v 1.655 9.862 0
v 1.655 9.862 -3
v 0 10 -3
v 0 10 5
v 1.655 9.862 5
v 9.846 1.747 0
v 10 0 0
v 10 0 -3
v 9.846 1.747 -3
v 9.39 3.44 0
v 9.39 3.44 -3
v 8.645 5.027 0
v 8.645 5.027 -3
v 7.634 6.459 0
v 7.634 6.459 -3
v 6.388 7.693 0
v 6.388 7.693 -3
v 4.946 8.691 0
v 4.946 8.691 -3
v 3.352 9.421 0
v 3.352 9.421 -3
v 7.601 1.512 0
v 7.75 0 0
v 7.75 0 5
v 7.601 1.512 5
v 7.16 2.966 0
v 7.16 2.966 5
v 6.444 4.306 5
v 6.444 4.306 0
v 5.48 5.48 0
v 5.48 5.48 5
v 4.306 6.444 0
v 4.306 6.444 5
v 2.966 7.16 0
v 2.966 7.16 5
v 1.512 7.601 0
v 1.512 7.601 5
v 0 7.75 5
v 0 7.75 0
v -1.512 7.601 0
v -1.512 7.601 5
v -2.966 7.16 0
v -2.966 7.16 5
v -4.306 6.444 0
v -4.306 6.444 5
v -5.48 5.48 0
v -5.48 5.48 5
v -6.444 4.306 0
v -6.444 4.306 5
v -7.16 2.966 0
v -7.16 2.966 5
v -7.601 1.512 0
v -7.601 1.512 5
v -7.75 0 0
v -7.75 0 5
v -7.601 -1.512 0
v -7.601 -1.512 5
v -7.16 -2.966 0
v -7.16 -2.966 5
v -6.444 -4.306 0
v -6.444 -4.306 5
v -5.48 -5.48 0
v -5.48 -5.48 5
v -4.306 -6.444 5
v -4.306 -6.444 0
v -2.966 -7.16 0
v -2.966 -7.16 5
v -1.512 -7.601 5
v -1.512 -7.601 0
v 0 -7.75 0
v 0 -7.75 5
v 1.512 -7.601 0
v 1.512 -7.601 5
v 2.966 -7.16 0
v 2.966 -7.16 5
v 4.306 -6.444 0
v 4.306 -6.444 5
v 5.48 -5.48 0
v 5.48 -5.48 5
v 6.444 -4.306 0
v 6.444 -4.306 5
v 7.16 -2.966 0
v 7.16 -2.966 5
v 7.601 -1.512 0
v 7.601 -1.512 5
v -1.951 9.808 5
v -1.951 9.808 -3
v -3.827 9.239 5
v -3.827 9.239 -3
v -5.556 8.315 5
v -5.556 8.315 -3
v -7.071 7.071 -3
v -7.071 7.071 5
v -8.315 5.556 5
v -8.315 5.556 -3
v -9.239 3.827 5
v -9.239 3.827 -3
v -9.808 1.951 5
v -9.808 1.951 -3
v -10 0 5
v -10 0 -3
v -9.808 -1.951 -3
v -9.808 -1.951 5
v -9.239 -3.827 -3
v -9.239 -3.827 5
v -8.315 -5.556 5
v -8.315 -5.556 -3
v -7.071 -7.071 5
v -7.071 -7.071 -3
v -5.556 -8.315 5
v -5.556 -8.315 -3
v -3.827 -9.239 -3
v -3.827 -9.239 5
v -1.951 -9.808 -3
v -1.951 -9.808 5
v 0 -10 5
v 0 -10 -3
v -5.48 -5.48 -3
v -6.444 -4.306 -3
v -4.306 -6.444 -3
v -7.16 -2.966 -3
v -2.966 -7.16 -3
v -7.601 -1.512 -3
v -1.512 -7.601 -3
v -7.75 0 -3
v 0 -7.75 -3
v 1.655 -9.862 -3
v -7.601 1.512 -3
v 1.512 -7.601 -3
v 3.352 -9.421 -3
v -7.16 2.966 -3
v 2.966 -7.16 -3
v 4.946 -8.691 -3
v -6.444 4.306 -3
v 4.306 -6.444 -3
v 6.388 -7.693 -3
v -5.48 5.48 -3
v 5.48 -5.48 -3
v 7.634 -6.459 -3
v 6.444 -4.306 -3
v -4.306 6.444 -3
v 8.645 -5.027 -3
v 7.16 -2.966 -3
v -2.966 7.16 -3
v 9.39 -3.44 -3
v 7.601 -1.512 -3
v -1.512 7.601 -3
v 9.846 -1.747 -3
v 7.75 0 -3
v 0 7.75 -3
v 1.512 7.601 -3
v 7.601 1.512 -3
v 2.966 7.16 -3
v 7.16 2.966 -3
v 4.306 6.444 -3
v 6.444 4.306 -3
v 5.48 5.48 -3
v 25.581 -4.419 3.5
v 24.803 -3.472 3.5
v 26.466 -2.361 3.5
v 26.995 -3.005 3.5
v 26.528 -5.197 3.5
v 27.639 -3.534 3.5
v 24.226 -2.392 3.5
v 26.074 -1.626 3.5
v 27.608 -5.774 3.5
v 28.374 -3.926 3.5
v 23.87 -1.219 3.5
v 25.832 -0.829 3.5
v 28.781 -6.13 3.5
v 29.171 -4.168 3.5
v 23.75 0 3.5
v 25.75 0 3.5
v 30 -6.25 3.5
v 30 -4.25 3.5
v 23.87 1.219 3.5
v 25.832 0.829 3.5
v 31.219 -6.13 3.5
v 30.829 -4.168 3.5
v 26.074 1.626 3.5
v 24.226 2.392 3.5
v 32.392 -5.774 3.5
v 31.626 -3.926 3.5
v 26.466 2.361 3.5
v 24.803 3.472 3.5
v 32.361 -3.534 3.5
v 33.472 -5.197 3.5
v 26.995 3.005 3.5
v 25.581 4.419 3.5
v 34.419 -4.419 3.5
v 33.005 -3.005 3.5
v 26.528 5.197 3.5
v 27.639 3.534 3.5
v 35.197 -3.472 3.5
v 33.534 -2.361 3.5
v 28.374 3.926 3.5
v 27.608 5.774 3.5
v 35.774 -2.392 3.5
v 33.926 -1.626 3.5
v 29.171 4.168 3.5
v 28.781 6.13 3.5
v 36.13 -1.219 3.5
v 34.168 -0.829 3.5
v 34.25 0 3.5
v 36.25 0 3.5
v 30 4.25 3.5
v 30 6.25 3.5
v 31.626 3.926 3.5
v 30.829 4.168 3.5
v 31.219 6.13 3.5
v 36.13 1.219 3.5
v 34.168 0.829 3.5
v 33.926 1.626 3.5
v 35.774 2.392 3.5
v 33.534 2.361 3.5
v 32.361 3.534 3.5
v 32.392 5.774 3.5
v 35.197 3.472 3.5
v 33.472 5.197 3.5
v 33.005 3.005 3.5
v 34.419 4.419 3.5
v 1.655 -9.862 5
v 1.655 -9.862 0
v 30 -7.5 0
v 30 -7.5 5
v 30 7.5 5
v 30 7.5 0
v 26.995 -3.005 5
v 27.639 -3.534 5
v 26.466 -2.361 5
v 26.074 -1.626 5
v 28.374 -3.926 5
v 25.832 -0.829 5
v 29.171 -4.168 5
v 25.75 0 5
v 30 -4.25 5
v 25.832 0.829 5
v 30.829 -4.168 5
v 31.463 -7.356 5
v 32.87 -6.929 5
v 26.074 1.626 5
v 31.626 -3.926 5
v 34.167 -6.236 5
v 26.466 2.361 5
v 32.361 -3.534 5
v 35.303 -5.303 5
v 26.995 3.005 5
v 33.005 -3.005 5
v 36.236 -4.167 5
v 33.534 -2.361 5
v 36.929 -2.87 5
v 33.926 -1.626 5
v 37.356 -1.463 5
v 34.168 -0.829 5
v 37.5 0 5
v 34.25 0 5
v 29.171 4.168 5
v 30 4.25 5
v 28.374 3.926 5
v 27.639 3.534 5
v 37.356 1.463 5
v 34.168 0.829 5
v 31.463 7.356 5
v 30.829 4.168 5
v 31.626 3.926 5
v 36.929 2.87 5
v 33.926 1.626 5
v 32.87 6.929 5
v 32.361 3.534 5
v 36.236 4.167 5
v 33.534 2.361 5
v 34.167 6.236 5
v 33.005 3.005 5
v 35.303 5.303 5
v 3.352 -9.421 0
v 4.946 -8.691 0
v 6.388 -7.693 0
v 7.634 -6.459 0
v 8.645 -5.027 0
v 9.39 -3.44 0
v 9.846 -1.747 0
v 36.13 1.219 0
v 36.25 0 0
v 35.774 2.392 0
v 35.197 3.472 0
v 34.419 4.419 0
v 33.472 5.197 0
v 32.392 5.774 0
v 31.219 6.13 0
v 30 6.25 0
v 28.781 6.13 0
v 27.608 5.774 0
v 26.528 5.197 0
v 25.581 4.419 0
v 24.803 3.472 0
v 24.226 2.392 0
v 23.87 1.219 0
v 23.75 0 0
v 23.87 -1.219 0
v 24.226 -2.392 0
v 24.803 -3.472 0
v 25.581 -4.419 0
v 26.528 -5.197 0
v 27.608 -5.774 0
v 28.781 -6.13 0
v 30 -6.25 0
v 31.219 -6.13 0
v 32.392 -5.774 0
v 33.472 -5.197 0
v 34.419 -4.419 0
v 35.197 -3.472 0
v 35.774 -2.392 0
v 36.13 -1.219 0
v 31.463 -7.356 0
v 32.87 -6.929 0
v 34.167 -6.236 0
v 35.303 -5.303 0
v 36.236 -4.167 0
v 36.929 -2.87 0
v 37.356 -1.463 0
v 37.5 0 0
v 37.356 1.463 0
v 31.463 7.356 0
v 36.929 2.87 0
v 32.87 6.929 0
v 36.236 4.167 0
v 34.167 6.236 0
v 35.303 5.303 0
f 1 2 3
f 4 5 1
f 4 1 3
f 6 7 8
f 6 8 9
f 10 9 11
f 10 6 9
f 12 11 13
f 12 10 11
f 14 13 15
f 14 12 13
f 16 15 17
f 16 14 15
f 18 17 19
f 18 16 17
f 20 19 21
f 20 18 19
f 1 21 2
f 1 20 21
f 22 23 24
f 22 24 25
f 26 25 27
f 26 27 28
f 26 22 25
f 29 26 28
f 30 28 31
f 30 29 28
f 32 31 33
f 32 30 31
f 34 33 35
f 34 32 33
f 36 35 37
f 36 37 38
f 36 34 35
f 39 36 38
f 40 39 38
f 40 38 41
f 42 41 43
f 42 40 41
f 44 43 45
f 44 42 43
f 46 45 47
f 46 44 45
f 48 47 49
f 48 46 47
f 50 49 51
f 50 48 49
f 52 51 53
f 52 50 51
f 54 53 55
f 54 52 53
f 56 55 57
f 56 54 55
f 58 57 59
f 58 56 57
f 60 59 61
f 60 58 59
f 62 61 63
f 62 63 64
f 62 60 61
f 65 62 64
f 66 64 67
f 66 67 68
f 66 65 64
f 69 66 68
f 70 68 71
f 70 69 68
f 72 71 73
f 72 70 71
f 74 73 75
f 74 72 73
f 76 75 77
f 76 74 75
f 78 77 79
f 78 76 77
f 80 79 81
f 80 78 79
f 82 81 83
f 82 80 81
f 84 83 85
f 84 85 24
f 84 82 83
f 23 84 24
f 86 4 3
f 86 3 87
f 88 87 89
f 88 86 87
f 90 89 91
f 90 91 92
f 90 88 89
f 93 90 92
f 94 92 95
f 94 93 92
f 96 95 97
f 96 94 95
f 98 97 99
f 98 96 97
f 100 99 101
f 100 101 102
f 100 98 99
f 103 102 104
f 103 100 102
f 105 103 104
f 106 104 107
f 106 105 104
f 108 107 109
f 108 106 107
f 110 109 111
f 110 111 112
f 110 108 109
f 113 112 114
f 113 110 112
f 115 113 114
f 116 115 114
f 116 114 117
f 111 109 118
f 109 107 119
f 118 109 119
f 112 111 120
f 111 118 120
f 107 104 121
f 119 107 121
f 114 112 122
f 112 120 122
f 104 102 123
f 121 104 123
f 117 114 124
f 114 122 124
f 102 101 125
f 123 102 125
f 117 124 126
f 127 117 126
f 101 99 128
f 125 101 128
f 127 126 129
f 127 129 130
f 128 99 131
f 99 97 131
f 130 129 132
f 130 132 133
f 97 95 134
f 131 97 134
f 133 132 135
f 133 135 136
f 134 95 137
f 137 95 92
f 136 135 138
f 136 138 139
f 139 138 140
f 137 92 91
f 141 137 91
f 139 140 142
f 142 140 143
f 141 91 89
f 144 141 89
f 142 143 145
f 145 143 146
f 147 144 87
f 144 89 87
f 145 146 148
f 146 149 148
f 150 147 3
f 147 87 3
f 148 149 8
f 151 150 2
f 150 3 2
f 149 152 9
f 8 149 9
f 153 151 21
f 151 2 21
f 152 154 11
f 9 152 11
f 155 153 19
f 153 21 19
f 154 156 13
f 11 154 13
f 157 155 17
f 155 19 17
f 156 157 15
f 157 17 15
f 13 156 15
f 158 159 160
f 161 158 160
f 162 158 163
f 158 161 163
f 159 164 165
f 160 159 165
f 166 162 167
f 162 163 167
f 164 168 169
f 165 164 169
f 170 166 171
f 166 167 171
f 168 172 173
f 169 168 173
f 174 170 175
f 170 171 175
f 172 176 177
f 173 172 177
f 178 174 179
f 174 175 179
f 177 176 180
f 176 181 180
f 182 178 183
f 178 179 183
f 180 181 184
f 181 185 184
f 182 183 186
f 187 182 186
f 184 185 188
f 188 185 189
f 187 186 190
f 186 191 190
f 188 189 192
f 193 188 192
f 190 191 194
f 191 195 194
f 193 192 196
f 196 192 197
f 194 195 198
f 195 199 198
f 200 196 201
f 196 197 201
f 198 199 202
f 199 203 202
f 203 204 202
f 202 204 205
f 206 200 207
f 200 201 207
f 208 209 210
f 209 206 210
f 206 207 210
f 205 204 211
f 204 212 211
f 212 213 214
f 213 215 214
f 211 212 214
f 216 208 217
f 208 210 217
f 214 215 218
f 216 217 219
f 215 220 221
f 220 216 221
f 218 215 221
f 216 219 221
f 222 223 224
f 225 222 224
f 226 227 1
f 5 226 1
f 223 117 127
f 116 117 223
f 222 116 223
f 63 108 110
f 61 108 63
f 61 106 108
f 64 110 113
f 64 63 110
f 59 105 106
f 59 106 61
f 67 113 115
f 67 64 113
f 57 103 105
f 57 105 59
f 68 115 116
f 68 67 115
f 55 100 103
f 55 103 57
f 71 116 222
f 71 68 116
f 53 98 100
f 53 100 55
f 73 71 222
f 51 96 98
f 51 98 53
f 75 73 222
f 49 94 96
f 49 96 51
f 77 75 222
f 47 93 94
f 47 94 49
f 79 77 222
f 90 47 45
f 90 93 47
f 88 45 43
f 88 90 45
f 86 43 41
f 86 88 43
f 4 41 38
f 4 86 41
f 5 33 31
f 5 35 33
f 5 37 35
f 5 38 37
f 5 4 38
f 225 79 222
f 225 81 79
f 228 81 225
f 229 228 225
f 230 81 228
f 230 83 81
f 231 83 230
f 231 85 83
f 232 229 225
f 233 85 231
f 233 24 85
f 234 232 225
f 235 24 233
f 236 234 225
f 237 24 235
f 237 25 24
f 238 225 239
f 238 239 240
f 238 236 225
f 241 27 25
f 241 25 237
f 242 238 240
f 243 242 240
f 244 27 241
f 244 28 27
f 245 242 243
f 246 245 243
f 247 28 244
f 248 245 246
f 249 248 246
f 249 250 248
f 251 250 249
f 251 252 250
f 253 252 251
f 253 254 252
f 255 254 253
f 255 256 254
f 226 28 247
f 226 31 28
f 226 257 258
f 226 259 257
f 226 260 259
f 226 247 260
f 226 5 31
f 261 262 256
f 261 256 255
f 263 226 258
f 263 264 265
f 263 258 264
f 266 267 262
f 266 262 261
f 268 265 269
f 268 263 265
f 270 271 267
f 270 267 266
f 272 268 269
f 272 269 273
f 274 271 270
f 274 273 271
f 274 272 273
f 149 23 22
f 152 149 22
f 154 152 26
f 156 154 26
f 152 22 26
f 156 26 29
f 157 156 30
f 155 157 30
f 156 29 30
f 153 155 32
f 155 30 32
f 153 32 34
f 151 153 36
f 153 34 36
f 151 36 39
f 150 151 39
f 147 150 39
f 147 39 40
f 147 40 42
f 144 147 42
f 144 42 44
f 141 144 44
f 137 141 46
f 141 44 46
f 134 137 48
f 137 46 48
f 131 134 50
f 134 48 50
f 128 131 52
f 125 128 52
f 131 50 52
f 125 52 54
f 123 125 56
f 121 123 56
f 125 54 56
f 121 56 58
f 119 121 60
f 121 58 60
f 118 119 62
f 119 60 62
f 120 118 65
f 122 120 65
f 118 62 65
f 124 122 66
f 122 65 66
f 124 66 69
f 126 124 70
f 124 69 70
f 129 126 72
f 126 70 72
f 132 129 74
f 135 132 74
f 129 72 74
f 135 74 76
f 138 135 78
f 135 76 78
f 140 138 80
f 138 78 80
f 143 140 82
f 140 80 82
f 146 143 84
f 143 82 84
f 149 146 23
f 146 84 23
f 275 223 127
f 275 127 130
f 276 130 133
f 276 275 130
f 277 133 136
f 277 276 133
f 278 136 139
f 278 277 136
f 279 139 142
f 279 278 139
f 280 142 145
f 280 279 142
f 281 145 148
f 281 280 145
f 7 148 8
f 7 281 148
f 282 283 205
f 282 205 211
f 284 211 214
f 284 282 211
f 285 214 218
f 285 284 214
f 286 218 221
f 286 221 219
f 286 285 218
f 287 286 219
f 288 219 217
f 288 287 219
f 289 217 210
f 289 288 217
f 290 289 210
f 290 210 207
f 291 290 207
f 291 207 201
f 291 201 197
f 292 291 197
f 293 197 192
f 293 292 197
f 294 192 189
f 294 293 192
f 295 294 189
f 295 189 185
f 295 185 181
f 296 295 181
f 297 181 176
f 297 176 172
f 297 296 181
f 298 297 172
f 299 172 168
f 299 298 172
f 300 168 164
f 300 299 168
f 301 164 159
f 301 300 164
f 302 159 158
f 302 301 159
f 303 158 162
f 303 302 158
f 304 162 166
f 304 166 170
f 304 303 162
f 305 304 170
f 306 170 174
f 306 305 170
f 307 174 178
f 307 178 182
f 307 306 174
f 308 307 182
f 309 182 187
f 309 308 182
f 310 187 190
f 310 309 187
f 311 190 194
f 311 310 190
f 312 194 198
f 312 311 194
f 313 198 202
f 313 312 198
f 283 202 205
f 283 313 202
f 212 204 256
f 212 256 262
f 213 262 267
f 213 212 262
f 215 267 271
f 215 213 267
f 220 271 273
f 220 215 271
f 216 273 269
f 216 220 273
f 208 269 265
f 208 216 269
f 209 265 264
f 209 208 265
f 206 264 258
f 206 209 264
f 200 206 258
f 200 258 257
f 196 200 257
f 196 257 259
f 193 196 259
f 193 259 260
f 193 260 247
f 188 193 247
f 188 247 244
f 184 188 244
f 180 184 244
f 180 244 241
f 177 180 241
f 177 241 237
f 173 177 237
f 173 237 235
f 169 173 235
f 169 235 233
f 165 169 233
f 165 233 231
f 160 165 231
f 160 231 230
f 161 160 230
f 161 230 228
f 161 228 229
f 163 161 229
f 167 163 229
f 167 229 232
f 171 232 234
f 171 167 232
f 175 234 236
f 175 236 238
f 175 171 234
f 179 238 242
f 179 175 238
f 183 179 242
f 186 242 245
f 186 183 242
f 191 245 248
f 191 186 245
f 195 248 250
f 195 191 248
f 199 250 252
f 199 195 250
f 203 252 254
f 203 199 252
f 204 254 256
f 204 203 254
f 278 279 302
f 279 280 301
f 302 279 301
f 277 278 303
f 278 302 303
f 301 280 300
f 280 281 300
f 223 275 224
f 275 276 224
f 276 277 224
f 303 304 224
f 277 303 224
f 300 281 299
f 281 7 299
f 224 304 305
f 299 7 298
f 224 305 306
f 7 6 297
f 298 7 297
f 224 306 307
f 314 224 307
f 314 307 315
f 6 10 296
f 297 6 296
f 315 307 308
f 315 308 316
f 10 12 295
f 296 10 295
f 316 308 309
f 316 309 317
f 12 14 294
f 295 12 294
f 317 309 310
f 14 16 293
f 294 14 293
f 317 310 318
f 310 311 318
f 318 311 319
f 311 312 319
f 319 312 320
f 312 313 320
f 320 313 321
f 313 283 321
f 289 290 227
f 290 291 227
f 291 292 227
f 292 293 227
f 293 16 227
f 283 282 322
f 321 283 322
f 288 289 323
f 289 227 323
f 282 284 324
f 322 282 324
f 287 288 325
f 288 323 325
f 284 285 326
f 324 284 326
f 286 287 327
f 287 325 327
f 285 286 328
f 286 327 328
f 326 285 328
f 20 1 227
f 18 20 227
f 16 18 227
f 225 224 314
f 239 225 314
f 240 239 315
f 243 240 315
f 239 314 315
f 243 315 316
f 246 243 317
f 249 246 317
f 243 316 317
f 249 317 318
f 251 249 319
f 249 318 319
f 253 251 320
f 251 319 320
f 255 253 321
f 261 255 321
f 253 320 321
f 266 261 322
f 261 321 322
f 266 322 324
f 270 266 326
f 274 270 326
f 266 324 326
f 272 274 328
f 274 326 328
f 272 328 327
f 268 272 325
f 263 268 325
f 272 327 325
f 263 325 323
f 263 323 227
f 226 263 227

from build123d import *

# Parameters (mm, degrees)
F0_R     = 7.75
F0_R_2   = 6.25
F0_R_3   = 4.25
F1_DEPTH = 5
F2_DEPTH = 3
F3_DEPTH = 3.5


with BuildPart() as f1:
    # F0 (on Top) → F1 (new body)
    with BuildSketch(Plane.XY):
        with BuildLine():
            Line((1.6551724138, 9.8620689655), (0, 10))
            ThreePointArc((0, 10), (-10, 0), (0, -10))
            Line((0, -10), (1.6551724138, -9.8620689655))
            ThreePointArc((1.6551724138, -9.8620689655), (7.6338628537, -6.4594224147), (10, 0))
            ThreePointArc((10, 0), (7.6338628537, 6.4594224147), (1.6551724138, 9.8620689655))
        make_face()
        Circle(F0_R, mode=Mode.SUBTRACT)
        with BuildLine():
            Line((30, 7.5), (1.6551724138, 9.8620689655))
            ThreePointArc((1.6551724138, 9.8620689655), (7.6338628537, 6.4594224147), (10, 0))
            ThreePointArc((10, 0), (7.6338628537, -6.4594224147), (1.6551724138, -9.8620689655))
            Line((1.6551724138, -9.8620689655), (30, -7.5))
            ThreePointArc((30, -7.5), (22.5, 0), (30, 7.5))
        make_face()
        with BuildLine():
            ThreePointArc((37.5, 0), (35.3033008589, 5.3033008589), (30, 7.5))
            ThreePointArc((30, 7.5), (22.5, 0), (30, -7.5))
            ThreePointArc((30, -7.5), (35.3033008589, -5.3033008589), (37.5, 0))
        make_face()
        with Locations((30, 0)):
            Circle(F0_R_2, mode=Mode.SUBTRACT)
        with Locations((30, 0)):
            Circle(F0_R_2)
        with Locations((30, 0)):
            Circle(F0_R_3, mode=Mode.SUBTRACT)
    extrude(amount=F1_DEPTH)

    # F0 (on Top) → F2 (join)
    with BuildSketch(Plane.XY):
        with BuildLine():
            Line((1.6551724138, 9.8620689655), (0, 10))
            ThreePointArc((0, 10), (-10, 0), (0, -10))
            Line((0, -10), (1.6551724138, -9.8620689655))
            ThreePointArc((1.6551724138, -9.8620689655), (7.6338628537, -6.4594224147), (10, 0))
            ThreePointArc((10, 0), (7.6338628537, 6.4594224147), (1.6551724138, 9.8620689655))
        make_face()
        Circle(F0_R, mode=Mode.SUBTRACT)
    extrude(amount=-F2_DEPTH)

    # F0 (on Top) → F3 (cut)
    with BuildSketch(Plane.XY):
        with Locations((30, 0)):
            Circle(F0_R_2)
        with Locations((30, 0)):
            Circle(F0_R_3, mode=Mode.SUBTRACT)
    extrude(amount=F3_DEPTH, mode=Mode.SUBTRACT)


solid = f1.part
